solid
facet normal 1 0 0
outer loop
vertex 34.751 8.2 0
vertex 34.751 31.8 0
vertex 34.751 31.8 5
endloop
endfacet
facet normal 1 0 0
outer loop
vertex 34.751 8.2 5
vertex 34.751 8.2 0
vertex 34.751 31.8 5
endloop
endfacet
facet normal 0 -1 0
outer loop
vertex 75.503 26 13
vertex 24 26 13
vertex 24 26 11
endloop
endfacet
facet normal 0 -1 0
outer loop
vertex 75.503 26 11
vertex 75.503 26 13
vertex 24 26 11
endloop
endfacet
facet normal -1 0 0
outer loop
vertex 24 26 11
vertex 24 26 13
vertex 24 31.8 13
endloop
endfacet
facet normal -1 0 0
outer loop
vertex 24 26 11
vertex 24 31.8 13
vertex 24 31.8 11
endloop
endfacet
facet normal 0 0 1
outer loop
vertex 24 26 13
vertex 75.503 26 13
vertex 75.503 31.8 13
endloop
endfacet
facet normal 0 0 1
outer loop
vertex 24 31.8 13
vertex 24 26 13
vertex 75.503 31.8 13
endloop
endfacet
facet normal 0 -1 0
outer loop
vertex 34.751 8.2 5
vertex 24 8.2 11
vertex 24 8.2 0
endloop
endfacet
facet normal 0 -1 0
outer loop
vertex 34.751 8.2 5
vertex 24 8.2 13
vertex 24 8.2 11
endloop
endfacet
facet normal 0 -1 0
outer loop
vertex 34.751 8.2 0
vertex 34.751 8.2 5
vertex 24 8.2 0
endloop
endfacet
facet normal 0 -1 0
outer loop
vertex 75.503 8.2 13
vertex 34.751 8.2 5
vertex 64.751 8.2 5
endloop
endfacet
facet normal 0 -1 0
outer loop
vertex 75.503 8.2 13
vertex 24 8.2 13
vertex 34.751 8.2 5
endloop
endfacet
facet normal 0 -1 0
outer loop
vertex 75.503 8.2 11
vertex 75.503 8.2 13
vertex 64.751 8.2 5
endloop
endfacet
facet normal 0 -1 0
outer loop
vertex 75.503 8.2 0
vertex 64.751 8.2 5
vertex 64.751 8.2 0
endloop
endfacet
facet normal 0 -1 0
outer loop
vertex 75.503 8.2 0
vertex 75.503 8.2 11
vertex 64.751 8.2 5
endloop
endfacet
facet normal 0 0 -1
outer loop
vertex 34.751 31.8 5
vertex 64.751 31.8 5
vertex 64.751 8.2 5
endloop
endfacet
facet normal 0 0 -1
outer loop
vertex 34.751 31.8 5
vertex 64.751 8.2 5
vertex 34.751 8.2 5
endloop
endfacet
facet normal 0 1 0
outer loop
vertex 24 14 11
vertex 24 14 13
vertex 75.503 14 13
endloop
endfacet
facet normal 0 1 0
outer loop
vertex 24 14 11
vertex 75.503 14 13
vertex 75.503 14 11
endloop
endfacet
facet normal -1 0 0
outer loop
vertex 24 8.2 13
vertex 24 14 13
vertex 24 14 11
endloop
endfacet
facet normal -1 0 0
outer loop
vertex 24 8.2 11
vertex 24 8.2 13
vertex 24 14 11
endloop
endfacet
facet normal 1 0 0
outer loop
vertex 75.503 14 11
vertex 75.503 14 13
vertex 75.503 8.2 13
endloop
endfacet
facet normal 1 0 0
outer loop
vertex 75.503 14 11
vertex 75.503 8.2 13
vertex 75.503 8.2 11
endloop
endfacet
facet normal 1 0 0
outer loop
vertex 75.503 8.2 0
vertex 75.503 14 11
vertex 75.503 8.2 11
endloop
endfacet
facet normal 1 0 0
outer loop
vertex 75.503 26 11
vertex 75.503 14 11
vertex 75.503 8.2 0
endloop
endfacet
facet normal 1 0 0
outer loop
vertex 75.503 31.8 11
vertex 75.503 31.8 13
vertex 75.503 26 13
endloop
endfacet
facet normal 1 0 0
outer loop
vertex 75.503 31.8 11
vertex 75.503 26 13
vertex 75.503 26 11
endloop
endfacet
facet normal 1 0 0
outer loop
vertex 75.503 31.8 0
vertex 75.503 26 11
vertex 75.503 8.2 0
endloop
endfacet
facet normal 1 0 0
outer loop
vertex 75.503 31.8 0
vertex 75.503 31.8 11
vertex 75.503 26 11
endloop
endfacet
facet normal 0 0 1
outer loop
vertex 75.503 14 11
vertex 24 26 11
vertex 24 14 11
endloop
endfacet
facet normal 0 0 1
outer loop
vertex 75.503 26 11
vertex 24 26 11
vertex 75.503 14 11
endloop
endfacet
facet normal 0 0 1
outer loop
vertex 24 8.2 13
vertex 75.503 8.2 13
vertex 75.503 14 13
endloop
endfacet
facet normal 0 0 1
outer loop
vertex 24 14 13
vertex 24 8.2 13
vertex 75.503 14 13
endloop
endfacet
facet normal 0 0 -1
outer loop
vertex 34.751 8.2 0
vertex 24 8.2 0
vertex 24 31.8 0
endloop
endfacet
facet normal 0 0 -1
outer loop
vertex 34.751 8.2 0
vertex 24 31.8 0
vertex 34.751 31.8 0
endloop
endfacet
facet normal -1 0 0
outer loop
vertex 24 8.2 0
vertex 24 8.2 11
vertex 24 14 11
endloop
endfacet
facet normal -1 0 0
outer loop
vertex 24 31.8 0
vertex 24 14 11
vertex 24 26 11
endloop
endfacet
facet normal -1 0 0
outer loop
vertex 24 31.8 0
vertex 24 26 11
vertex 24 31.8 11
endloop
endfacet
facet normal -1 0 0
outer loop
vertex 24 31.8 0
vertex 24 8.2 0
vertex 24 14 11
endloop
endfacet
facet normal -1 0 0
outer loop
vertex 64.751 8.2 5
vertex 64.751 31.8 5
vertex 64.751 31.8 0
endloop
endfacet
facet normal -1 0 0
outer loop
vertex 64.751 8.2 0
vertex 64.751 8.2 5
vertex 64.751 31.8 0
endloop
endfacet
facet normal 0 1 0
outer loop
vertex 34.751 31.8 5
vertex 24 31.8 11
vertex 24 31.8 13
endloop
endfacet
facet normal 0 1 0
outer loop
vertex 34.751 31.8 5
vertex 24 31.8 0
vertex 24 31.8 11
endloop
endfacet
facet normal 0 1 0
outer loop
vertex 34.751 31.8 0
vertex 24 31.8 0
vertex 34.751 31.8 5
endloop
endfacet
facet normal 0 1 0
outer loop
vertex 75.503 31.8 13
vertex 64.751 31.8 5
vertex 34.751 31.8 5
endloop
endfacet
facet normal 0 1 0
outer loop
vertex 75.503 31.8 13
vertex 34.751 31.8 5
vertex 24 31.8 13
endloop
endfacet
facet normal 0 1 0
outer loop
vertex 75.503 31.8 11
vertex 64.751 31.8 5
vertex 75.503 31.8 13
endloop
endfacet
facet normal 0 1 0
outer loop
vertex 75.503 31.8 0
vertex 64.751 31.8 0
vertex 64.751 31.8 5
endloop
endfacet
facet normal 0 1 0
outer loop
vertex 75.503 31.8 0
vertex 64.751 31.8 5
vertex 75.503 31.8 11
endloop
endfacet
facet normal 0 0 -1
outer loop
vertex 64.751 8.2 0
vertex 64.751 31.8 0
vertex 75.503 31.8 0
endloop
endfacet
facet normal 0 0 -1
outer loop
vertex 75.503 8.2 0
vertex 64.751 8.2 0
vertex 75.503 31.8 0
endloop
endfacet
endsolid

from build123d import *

# Parameters (mm, degrees)
CROQUIS2_W              = 51.502836605
CROQUIS2_H              = 23.6
SALIENTE_EXTRUIR1_DEPTH = 11
CROQUIS4_W              = 2
CROQUIS4_H              = 5.8
SALIENTE_EXTRUIR2_DEPTH = 51.502837
CORTAR_EXTRUIR1_START   = -23.6
CORTAR_EXTRUIR1_DEPTH   = 23.6


with BuildPart() as part:
    # Croquis2 → Saliente-Extruir1 (new body)
    with BuildSketch(Plane.XY):
        with Locations((49.751418302, 20)):
            Rectangle(CROQUIS2_W, CROQUIS2_H)
    extrude(amount=SALIENTE_EXTRUIR1_DEPTH)

    # Croquis4 → Saliente-Extruir2 (add)
    with BuildSketch(Plane(origin=(75.502836605, 0, 0), x_dir=(0, 0, -1), z_dir=(1, 0, 0))):
        with Locations((-12, 11.1)):
            Rectangle(CROQUIS4_W, CROQUIS4_H)
        with Locations((-12, 28.9)):
            Rectangle(CROQUIS4_W, CROQUIS4_H)
    extrude(amount=-SALIENTE_EXTRUIR2_DEPTH)

    # Croquis5 → Cortar-Extruir1 (cut)
    with BuildSketch(Plane.XZ.offset(-8.2).offset(CORTAR_EXTRUIR1_START)):
        Polygon((49.751418302, 0), (34.751418302, 0), (34.751418302, 5), (49.751418302, 5), (64.751418302, 5), (64.751418302, 0), align=None)
    extrude(amount=CORTAR_EXTRUIR1_DEPTH, mode=Mode.SUBTRACT)


solid = part.part
